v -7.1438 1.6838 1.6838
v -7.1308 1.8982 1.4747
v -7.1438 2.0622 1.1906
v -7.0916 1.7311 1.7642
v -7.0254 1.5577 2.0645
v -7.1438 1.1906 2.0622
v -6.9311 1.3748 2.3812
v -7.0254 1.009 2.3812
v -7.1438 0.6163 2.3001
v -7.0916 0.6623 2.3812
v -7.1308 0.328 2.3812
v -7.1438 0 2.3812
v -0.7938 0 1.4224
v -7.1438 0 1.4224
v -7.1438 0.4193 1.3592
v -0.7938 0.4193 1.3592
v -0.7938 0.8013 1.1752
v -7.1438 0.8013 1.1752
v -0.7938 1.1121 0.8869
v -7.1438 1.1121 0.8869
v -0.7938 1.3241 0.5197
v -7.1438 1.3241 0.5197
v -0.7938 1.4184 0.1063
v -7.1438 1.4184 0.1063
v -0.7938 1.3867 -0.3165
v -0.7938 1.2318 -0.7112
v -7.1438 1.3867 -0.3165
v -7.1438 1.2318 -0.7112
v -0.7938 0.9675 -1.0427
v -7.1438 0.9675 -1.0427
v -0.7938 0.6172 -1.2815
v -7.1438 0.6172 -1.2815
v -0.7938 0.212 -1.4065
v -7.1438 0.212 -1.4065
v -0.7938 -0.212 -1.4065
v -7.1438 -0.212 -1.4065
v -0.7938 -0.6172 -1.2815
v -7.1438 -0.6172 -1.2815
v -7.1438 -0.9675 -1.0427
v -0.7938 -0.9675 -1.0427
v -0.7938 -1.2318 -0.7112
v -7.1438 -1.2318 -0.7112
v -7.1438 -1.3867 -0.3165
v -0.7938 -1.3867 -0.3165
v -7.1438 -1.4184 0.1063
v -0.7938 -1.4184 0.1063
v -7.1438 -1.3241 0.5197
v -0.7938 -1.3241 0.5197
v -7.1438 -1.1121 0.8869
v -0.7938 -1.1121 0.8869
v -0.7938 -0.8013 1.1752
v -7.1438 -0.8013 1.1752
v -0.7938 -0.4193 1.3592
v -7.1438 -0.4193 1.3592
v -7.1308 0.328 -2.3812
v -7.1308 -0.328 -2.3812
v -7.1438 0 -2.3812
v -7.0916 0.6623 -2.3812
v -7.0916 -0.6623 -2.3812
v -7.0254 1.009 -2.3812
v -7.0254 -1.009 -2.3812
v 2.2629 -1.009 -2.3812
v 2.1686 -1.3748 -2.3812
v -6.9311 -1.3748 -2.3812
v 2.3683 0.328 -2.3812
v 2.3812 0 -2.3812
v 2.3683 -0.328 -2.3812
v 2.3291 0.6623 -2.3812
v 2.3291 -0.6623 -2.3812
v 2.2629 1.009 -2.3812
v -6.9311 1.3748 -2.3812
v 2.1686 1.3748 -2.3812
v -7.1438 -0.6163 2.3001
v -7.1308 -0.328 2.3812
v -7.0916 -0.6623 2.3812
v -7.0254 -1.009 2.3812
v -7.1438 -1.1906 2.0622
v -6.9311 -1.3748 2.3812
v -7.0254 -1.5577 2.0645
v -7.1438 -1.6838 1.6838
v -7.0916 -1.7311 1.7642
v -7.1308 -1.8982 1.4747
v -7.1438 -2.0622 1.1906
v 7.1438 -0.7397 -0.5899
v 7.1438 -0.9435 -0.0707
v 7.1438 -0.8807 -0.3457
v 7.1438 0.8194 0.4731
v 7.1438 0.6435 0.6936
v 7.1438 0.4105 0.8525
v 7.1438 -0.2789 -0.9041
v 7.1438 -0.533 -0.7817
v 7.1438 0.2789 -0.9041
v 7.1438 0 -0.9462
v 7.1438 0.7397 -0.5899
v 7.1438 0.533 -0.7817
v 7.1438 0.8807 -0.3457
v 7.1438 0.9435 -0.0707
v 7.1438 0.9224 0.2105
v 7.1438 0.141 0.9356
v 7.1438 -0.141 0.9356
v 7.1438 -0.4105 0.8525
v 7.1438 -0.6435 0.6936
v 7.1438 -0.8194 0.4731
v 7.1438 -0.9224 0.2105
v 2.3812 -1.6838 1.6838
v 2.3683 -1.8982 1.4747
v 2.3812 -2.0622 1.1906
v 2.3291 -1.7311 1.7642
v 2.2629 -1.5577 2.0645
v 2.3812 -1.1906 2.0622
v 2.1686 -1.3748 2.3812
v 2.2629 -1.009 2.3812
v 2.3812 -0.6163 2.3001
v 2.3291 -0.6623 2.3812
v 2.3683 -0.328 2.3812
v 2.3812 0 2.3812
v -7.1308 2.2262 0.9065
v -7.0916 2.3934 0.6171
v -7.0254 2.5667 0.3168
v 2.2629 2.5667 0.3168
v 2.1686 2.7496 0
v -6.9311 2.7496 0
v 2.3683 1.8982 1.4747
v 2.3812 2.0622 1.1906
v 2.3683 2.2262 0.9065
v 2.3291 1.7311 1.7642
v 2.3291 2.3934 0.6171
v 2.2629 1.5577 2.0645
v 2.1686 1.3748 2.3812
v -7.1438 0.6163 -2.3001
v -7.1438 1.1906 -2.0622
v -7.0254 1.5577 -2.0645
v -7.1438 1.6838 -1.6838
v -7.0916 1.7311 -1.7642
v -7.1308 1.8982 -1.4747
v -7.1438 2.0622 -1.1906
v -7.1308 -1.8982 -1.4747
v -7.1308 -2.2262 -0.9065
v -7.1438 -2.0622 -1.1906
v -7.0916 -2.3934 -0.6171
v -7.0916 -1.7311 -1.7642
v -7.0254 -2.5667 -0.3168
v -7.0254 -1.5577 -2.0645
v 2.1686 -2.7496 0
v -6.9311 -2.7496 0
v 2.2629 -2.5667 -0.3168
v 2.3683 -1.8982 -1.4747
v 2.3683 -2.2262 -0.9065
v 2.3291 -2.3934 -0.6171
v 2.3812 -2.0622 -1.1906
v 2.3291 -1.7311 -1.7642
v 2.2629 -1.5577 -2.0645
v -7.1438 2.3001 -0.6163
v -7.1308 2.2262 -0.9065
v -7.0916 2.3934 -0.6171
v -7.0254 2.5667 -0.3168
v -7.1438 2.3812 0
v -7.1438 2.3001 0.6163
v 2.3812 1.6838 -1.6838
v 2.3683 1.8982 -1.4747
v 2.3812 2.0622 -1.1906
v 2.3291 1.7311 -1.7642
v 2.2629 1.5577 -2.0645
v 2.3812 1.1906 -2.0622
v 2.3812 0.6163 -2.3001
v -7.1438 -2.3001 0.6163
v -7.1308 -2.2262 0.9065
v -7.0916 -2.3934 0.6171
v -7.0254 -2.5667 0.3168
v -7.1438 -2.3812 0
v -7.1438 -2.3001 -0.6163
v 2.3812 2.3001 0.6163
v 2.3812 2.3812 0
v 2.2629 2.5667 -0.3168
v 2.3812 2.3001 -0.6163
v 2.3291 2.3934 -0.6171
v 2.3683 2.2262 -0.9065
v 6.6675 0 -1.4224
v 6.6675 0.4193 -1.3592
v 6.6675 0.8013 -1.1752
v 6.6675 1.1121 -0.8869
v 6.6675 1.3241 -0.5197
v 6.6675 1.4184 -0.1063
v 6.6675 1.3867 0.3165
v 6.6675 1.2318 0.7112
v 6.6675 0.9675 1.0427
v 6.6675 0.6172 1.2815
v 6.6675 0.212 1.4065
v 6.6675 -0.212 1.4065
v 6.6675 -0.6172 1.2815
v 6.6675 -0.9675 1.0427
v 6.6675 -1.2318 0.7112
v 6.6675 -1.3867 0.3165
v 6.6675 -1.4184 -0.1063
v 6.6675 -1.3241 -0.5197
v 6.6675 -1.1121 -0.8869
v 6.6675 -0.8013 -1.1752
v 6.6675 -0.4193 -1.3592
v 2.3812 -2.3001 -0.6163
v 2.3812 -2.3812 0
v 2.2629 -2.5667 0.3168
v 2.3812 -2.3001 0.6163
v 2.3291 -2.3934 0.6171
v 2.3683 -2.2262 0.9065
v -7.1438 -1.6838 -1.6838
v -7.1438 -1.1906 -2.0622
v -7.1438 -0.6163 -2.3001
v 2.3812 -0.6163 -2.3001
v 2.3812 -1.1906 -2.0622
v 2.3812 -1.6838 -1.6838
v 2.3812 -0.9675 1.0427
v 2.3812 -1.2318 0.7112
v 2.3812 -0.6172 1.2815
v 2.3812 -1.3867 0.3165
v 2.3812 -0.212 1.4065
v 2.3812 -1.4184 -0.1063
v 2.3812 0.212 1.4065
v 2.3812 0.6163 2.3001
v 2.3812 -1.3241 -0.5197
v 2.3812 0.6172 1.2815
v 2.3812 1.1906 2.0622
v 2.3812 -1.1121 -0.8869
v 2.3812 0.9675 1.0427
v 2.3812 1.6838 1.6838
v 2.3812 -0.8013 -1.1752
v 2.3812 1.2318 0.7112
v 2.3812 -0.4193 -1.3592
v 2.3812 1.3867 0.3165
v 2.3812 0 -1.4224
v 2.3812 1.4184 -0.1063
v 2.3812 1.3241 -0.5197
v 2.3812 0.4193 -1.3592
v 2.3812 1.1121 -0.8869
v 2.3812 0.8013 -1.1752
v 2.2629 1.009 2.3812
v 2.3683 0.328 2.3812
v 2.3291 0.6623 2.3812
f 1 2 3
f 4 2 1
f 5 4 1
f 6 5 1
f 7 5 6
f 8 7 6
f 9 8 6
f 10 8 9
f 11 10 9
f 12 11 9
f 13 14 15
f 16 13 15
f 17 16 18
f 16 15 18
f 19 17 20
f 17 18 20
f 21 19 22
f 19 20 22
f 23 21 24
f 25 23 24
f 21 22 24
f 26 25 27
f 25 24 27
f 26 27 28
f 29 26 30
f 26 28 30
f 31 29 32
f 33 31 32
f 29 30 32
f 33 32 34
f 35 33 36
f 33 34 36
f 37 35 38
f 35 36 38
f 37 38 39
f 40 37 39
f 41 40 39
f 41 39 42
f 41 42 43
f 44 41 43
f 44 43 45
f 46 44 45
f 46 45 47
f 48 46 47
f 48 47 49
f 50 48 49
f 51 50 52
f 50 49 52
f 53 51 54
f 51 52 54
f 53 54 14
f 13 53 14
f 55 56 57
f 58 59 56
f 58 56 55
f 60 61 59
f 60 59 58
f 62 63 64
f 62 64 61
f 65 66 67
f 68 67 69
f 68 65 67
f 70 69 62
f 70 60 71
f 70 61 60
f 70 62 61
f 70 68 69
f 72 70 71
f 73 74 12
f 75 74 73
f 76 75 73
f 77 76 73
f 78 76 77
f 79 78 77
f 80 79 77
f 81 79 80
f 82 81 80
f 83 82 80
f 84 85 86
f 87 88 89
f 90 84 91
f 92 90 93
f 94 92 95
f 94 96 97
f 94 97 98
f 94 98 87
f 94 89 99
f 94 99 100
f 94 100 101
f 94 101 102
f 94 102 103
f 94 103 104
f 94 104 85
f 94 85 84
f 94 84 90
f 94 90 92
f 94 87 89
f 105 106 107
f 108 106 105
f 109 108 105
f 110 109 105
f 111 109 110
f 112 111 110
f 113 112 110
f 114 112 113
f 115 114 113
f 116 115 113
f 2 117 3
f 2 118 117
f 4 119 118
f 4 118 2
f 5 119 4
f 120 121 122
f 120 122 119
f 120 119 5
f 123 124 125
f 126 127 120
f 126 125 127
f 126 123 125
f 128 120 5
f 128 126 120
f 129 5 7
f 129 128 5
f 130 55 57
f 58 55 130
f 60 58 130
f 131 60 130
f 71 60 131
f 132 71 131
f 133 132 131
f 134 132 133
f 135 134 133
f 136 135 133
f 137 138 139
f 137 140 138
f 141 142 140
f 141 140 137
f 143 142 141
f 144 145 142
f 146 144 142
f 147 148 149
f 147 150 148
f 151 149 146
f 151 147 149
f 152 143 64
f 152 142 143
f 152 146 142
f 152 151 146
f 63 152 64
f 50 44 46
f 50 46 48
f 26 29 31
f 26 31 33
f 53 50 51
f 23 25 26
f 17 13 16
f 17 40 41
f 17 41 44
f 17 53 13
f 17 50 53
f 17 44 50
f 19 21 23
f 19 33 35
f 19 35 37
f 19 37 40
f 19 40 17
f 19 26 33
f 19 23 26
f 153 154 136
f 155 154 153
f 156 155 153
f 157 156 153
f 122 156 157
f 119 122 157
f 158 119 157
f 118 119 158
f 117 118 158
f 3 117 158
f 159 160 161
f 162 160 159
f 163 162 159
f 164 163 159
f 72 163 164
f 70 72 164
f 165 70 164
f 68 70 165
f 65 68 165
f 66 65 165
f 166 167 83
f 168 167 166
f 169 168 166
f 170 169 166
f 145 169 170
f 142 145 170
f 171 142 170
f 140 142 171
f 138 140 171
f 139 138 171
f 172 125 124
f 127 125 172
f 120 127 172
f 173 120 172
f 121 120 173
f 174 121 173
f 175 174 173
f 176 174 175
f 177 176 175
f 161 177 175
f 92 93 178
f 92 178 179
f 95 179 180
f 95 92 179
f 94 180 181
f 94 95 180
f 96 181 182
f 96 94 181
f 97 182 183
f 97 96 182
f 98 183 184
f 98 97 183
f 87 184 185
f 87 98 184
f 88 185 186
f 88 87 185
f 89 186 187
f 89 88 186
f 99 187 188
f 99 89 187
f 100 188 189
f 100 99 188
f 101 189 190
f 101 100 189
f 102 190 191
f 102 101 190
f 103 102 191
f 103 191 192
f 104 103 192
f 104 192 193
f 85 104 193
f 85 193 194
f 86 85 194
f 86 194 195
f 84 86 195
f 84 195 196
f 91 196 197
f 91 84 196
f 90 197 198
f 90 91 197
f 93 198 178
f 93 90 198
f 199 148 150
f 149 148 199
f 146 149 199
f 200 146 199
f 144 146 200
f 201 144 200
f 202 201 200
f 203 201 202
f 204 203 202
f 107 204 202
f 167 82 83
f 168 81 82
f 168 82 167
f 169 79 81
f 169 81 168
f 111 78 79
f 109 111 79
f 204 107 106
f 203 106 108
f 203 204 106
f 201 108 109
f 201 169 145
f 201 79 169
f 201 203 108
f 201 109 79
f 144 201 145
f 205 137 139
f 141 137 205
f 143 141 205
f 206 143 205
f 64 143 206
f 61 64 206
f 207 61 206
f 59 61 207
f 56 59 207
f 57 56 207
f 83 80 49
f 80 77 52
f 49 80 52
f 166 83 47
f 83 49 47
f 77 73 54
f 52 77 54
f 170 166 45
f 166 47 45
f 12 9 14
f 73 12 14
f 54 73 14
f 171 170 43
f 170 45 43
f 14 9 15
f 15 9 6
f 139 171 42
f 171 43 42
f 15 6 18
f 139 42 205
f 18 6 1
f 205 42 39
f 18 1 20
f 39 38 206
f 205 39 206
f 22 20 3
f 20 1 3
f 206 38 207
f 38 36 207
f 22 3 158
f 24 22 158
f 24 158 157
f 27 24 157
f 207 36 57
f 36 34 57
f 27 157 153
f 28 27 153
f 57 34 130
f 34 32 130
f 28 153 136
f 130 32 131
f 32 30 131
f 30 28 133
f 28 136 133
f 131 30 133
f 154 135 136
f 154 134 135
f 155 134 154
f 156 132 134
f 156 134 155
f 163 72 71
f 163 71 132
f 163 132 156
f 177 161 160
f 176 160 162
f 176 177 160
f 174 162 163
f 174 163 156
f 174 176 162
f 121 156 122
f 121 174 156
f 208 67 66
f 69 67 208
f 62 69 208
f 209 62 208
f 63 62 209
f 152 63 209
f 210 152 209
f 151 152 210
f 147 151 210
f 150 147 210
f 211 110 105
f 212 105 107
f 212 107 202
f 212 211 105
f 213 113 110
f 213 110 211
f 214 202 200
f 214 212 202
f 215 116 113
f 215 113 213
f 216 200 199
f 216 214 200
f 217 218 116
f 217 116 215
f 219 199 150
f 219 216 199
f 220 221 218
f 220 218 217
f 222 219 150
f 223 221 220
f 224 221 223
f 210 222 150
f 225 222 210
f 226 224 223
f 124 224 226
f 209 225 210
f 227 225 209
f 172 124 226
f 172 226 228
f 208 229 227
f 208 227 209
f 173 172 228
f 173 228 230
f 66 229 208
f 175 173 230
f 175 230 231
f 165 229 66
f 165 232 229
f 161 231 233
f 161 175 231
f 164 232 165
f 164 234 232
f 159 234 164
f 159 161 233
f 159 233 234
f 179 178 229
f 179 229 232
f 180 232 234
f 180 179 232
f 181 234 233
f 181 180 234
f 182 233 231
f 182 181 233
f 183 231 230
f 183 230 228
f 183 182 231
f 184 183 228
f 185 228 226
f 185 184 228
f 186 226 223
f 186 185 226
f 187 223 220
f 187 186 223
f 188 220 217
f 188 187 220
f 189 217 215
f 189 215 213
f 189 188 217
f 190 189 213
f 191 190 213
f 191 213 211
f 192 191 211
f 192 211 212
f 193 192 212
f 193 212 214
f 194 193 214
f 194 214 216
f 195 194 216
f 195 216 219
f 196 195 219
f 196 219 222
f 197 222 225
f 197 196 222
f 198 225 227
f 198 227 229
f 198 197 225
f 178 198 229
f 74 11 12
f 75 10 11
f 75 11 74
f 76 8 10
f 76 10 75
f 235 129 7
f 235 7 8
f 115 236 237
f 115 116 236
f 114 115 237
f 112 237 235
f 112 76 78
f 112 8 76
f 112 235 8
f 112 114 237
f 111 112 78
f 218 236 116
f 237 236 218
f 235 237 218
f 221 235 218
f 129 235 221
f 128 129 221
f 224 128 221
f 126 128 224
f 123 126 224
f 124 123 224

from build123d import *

# Parameters (mm, degrees)
SKETCH2_R         = 1.4224
EXTRUDE1_DEPTH    = 4.7625
CHAMFER1_SIZE     = 0.47625
EXTRUDE4_DEPTH    = 9.525
SKETCH8_OUTSIDE_W = 62.926
SKETCH8_OUTSIDE_H = 63.664
SKETCH8_OUTSIDE_R = 2.38125
EXTRUDE5_DEPTH    = 15.2875
EXTRUDE5_TAPER    = 60
SKETCH9_OUTSIDE_W = 46.428
SKETCH9_OUTSIDE_H = 47.166
SKETCH9_OUTSIDE_R = 2.38125
EXTRUDE6_DEPTH    = 10.525
EXTRUDE6_TAPER    = 60
SKETCH10_R        = 1.4224
EXTRUDE7_DEPTH    = 6.35


with BuildPart() as part:
    # Sketch2 → Extrude1 (new body)
    with BuildSketch(Plane(origin=(7.14375, 0, 0), x_dir=(0, 0, -1), z_dir=(1, 0, 0))):
        Circle(SKETCH2_R)
    extrude(amount=-EXTRUDE1_DEPTH)

    # Chamfer1
    chamfer1_edges = [part.edges().sort_by_distance(p)[0] for p in [
        (7.14375, 0, 1.4224),
    ]]
    chamfer(chamfer1_edges, length=CHAMFER1_SIZE)

    # Sketch7 → Extrude4 (add)
    with BuildSketch(Plane(origin=(2.38125, 0, 0), x_dir=(0, 0, -1), z_dir=(1, 0, 0))):
        Polygon((0, 2.749630657), (-2.38125, 1.374815329), (-2.38125, -1.374815329), (0, -2.749630657), (2.38125, -1.374815329), (2.38125, 1.374815329), align=None)
    extrude(amount=-EXTRUDE4_DEPTH)

    # Sketch8 outside → Extrude5 (cut, through all)
    with BuildSketch(Plane.ZY.offset(7.14375)):
        Rectangle(SKETCH8_OUTSIDE_W, SKETCH8_OUTSIDE_H)
        Circle(SKETCH8_OUTSIDE_R, mode=Mode.SUBTRACT)
    extrude(amount=-EXTRUDE5_DEPTH, taper=EXTRUDE5_TAPER, mode=Mode.SUBTRACT)

    # Sketch9 outside → Extrude6 (cut, through all)
    with BuildSketch(Plane(origin=(2.38125, 0, 0), x_dir=(0, 0, -1), z_dir=(1, 0, 0))):
        Rectangle(SKETCH9_OUTSIDE_W, SKETCH9_OUTSIDE_H)
        Circle(SKETCH9_OUTSIDE_R, mode=Mode.SUBTRACT)
    extrude(amount=-EXTRUDE6_DEPTH, taper=EXTRUDE6_TAPER, mode=Mode.SUBTRACT)

    # Sketch10 → Extrude7 (cut)
    with BuildSketch(Plane.ZY.offset(7.14375)):
        Circle(SKETCH10_R)
    extrude(amount=-EXTRUDE7_DEPTH, mode=Mode.SUBTRACT)


solid = part.part
